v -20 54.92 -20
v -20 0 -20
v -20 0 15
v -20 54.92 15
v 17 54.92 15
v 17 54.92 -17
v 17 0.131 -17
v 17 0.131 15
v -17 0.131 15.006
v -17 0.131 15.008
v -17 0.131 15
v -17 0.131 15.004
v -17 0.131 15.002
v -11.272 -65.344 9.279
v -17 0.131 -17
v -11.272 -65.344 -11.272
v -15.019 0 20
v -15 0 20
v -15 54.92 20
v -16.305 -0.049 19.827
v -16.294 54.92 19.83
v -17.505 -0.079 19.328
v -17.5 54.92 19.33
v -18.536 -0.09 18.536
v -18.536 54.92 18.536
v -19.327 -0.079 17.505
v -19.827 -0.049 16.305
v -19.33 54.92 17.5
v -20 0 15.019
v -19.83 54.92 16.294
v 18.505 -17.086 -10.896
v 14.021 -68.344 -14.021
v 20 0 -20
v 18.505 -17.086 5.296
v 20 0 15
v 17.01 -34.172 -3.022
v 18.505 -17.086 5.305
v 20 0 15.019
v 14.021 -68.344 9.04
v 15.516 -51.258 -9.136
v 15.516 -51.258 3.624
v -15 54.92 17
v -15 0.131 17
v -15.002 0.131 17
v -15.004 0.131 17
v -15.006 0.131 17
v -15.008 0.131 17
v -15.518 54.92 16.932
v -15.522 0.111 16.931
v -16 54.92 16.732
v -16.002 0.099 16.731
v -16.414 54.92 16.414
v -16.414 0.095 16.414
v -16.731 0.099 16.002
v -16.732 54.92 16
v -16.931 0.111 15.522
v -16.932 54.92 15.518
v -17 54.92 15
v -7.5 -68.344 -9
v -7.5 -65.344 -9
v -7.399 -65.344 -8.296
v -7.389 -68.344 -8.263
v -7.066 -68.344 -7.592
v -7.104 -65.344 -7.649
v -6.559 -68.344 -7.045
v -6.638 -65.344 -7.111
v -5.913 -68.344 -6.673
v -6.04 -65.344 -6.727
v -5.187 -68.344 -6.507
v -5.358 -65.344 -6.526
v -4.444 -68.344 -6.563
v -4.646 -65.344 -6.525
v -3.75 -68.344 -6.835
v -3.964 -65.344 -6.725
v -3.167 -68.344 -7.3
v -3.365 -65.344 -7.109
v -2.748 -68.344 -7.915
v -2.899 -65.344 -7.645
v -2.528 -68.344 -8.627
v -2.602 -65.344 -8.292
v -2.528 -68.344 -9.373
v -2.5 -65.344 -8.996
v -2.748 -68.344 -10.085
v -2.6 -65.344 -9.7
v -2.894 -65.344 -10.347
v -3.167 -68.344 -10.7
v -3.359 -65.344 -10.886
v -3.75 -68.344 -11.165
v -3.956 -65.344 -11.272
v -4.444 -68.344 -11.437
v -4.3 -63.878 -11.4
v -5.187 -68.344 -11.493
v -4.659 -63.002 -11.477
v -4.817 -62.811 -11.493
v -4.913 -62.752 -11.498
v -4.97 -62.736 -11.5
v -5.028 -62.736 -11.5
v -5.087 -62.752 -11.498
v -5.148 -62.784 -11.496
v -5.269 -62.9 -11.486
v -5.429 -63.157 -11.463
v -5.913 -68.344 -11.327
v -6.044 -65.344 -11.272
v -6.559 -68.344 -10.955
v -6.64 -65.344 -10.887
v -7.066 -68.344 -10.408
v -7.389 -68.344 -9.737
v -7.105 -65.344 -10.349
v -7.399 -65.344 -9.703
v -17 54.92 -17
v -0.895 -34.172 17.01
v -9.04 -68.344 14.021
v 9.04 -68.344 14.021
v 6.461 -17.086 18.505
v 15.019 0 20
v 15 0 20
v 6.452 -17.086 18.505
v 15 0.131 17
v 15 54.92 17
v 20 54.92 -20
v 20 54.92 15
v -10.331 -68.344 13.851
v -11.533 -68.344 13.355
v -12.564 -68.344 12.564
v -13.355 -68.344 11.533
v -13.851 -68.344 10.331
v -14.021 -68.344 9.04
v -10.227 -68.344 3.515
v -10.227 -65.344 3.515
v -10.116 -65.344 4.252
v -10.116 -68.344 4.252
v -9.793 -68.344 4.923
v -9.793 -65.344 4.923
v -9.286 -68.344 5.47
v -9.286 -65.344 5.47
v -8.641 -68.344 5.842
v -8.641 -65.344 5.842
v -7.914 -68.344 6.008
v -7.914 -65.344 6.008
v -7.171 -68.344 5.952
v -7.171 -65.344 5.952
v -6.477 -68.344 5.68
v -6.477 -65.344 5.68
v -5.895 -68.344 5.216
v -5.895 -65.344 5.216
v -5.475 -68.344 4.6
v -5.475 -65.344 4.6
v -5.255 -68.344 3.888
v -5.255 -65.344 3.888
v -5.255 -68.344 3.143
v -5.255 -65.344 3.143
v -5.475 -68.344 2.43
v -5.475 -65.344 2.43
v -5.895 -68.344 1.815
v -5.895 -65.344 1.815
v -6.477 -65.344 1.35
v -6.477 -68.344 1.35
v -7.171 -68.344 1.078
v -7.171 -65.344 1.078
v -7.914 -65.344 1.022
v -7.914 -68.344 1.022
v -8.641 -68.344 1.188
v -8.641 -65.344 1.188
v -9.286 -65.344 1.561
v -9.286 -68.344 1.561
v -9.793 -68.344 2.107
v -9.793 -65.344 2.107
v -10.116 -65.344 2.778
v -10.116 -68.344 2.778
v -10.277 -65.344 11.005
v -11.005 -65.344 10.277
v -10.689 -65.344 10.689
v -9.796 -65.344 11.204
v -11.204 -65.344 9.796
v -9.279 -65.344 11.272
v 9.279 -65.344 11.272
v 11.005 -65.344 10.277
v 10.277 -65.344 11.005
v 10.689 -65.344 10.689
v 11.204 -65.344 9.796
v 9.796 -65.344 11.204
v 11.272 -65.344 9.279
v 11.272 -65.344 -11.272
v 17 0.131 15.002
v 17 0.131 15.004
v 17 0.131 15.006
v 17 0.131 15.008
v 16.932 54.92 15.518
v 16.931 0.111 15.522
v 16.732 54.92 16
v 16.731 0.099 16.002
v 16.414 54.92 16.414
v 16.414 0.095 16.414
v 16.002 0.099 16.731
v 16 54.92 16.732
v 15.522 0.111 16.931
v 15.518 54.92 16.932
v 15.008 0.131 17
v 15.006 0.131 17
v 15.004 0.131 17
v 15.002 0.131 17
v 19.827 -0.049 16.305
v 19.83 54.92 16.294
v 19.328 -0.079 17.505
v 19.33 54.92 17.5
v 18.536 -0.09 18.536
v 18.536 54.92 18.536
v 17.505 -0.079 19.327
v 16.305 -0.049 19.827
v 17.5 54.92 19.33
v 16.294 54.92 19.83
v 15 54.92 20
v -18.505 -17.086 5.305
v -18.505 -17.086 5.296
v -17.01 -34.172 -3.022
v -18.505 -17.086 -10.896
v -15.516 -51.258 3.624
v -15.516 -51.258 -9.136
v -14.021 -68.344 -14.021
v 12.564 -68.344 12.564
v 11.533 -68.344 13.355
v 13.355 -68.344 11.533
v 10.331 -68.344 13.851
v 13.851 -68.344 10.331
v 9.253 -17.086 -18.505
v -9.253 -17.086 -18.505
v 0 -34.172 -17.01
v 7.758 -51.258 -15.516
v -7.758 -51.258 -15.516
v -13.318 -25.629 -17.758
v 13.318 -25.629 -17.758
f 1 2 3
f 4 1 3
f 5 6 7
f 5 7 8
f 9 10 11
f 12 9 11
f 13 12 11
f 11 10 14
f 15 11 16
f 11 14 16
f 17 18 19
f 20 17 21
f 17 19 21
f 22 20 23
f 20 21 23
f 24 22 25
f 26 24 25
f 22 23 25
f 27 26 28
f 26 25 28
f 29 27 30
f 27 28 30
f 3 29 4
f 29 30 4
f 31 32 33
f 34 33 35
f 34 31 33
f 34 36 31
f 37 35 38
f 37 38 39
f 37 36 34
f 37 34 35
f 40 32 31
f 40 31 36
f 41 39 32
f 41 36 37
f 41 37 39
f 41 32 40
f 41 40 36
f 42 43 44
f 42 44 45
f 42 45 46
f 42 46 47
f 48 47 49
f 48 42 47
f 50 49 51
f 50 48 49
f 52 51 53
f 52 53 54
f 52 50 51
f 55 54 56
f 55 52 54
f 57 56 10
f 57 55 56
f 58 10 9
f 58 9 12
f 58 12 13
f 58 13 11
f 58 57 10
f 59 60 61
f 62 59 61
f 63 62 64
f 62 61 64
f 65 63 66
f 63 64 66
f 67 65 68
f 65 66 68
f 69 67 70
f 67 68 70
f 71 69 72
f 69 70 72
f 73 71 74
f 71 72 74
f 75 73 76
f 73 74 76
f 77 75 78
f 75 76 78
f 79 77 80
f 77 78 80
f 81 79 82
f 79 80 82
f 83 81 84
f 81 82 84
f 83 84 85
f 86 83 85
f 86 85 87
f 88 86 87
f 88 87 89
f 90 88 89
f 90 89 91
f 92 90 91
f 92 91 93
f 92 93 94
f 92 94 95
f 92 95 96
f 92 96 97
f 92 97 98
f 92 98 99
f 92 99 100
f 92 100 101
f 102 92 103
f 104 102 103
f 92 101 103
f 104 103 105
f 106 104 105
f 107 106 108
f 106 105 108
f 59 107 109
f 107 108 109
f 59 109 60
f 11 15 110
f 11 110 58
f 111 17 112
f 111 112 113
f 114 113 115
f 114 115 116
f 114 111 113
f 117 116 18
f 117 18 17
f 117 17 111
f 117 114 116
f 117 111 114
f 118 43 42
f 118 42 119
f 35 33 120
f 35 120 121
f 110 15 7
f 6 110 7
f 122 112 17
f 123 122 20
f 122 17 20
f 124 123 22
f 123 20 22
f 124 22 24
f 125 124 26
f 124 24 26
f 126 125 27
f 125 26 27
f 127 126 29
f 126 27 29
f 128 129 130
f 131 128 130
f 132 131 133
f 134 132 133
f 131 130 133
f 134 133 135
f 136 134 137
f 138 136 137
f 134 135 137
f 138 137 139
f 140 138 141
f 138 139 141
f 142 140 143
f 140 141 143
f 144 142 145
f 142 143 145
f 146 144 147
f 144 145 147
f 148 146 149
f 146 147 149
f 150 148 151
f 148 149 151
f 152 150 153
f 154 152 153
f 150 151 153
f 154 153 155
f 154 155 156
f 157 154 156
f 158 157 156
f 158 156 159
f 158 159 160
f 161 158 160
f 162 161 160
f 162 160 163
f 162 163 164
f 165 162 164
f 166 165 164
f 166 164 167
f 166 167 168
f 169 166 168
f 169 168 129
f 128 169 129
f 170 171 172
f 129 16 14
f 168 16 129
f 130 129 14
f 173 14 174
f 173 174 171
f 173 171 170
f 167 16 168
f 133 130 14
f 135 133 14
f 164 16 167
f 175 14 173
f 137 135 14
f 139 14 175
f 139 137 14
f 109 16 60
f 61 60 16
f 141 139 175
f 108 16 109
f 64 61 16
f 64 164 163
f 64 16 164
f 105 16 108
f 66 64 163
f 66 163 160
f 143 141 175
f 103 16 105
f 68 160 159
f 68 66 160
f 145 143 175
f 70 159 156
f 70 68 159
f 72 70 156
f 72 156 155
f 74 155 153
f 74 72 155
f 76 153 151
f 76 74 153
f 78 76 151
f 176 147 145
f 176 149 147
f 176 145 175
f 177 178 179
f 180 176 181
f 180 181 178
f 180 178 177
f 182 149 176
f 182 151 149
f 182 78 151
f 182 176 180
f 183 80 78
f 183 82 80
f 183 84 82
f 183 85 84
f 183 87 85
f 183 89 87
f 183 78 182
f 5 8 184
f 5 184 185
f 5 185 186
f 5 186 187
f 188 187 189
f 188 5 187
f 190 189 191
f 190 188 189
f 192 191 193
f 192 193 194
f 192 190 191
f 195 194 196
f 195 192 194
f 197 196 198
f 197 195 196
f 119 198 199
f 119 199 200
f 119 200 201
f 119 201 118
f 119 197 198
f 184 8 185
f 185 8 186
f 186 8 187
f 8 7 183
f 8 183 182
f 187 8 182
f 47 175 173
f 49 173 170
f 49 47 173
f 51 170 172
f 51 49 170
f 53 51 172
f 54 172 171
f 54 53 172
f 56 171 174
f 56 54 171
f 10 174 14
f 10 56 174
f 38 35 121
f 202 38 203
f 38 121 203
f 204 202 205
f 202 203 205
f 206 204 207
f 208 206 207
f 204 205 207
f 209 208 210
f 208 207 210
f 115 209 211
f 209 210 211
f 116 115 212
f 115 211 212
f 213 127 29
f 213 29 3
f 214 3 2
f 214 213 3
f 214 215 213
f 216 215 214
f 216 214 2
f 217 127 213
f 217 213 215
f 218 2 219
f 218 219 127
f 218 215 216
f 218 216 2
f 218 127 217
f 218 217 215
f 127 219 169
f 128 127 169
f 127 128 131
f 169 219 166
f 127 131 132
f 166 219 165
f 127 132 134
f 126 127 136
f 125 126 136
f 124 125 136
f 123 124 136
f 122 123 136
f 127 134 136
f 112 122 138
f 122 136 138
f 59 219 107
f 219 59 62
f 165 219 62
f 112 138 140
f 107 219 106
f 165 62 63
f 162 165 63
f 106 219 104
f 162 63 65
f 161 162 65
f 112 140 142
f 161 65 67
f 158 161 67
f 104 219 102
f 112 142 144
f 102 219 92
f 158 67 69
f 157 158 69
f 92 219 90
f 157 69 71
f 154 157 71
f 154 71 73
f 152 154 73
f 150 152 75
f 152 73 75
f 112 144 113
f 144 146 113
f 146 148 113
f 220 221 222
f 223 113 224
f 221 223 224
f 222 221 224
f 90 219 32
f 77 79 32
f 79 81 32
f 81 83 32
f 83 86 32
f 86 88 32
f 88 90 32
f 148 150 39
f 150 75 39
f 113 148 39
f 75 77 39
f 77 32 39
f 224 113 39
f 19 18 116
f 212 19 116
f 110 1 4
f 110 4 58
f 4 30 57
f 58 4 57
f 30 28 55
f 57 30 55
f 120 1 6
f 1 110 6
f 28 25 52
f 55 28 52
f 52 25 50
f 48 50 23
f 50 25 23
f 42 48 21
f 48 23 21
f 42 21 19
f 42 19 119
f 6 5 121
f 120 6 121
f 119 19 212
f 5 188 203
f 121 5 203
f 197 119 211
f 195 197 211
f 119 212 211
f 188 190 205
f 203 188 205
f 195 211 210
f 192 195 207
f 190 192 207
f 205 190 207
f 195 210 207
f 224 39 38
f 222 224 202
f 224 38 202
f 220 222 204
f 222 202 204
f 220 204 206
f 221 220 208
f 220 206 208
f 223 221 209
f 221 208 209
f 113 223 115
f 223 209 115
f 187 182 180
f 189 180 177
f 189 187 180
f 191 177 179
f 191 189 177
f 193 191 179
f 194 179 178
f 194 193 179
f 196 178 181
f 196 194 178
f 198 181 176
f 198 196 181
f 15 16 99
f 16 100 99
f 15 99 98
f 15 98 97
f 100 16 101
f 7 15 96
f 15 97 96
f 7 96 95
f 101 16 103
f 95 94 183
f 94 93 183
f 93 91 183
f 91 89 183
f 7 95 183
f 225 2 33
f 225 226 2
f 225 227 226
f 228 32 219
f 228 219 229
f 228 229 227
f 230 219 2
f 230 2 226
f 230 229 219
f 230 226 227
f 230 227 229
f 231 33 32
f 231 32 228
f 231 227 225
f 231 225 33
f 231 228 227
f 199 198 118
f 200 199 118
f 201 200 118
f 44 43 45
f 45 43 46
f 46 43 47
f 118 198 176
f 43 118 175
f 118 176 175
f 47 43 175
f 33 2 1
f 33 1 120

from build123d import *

# Parameters (mm, degrees)
F0_W          = 40
F0_H          = 40
F1_DEPTH      = 68.34402
F1_TAPER      = 5
F1_DEPTH_BACK = 54.92041
F2_T1_DEPTH   = 129.92041
F2_T3_DEPTH   = 143.2975946274
F2_T5_DEPTH   = 143.2975946274
F3_T          = 3
F5_D          = 5


# Not quite as in the source:
# - a fillet or chamfer that OpenCascade refuses, or shapes differently, is made with other operations: its cross-section is extruded or revolved along the edge and cut away or added
# - a shell that OpenCascade refuses in one call is made with other operations: the cavity is built on its own and cut out


with BuildPart() as f1:
    # F0 (on Front) → F1 (new body, two sides)
    with BuildSketch(Plane.XZ) as f1_sk:
        Rectangle(F0_W, F0_H)
    extrude(amount=F1_DEPTH, taper=F1_TAPER)
    extrude(f1_sk.sketch, amount=-F1_DEPTH_BACK)

    # F2: fillet of radius 5 on 4 edges, made by hand

    # F2_s2 → F2_t1 (cut)
    with BuildSketch(Plane.XZ.offset(-67.42041)):
        with BuildLine():
            ThreePointArc((20, 15), (18.5355339059, 18.5355339059), (15, 20))
            Line((15, 20), (20, 20))
            Line((20, 20), (20, 15))
        make_face()
        with BuildLine():
            ThreePointArc((-15, 20), (-18.5355339059, 18.5355339059), (-20, 15))
            Line((-20, 15), (-20, 20))
            Line((-20, 20), (-15, 20))
        make_face()
    extrude(amount=F2_T1_DEPTH, mode=Mode.SUBTRACT)

    # F2_s4 → F2_t3 (cut)
    with BuildSketch(Plane(origin=(5.6871501966, 65.0044242011, 5.6871501966), x_dir=(0.9961946981, -0.0871557427, 0), z_dir=(-0.0868265939, -0.9924325091, -0.0868265939))):
        with BuildLine():
            ThreePointArc((19.9238939618, 14.8109575307), (18.4728306397, 18.3330376627), (14.9618745793, 19.8108132759))
            Line((14.9618745793, 19.8108132759), (19.9238939618, 19.7731200764))
            Line((19.9238939618, 19.7731200764), (19.9238939618, 14.8109575307))
        make_face()
    extrude(amount=F2_T3_DEPTH, mode=Mode.SUBTRACT)

    # F2_s6 → F2_t5 (cut)
    with BuildSketch(Plane(origin=(-5.6871501966, 65.0044242011, 5.6871501966), x_dir=(0.9961946981, 0.0871557427, 0), z_dir=(0.0868265939, -0.9924325091, -0.0868265939))):
        with BuildLine():
            ThreePointArc((-14.9618745793, 19.8108132759), (-18.4728306397, 18.3330376627), (-19.9238939618, 14.8109575307))
            Line((-19.9238939618, 14.8109575307), (-19.9238939618, 19.7731200764))
            Line((-19.9238939618, 19.7731200764), (-14.9618745793, 19.8108132759))
        make_face()
    extrude(amount=F2_T5_DEPTH, mode=Mode.SUBTRACT)

    # F3: shell of thickness 3, made by hand


with BuildPart() as f3_core1:
    # F3_t2: copy of F1
    add(f1.part)

    # the walls: a layer under each face that stays
    f3_faces = [f3_core1.faces().sort_by_distance(p)[0] for p in [
        (20, 27.460205, -2.5),
        (17.0103365151, -34.17201, -2.1182047008),
        (18.5355339059, 27.415284207, 18.5355339059),
        (0, 27.460205, -20),
        (0, -34.17201, -17.0103365151),
        (0, -68.34402, -1.4566061483),
        (15.5420062021, -34.3060178162, 15.5420062021),
        (0, 27.460205, 20),
        (0, -34.17201, 17.0103365151),
        (-20, 27.460205, -2.5),
        (-18.5355339059, 27.415284207, 18.5355339059),
        (-17.0103365151, -34.17201, -2.1182047008),
        (-15.5420062021, -34.3060178161, 15.5420062021),
    ]]
    thicken(f3_faces, amount=-F3_T, mode=Mode.SUBTRACT)


with BuildPart() as f1_1:
    add(f1.part)

    # what is left inside the walls is the cavity
    f3_cavity = [f3_core1.part.solids().sort_by_distance(p)[0] for p in [
        (0, 36.657268, -16.97),
    ]]
    add(f3_cavity, mode=Mode.SUBTRACT)

    # F5 (through all)
    with Locations(Plane.XZ.offset(68.34402)):
        with Locations((-5, -9), (-7.7271993353, 3.5151276782)):
            Hole(F5_D / 2)


solid = f1_1.part
